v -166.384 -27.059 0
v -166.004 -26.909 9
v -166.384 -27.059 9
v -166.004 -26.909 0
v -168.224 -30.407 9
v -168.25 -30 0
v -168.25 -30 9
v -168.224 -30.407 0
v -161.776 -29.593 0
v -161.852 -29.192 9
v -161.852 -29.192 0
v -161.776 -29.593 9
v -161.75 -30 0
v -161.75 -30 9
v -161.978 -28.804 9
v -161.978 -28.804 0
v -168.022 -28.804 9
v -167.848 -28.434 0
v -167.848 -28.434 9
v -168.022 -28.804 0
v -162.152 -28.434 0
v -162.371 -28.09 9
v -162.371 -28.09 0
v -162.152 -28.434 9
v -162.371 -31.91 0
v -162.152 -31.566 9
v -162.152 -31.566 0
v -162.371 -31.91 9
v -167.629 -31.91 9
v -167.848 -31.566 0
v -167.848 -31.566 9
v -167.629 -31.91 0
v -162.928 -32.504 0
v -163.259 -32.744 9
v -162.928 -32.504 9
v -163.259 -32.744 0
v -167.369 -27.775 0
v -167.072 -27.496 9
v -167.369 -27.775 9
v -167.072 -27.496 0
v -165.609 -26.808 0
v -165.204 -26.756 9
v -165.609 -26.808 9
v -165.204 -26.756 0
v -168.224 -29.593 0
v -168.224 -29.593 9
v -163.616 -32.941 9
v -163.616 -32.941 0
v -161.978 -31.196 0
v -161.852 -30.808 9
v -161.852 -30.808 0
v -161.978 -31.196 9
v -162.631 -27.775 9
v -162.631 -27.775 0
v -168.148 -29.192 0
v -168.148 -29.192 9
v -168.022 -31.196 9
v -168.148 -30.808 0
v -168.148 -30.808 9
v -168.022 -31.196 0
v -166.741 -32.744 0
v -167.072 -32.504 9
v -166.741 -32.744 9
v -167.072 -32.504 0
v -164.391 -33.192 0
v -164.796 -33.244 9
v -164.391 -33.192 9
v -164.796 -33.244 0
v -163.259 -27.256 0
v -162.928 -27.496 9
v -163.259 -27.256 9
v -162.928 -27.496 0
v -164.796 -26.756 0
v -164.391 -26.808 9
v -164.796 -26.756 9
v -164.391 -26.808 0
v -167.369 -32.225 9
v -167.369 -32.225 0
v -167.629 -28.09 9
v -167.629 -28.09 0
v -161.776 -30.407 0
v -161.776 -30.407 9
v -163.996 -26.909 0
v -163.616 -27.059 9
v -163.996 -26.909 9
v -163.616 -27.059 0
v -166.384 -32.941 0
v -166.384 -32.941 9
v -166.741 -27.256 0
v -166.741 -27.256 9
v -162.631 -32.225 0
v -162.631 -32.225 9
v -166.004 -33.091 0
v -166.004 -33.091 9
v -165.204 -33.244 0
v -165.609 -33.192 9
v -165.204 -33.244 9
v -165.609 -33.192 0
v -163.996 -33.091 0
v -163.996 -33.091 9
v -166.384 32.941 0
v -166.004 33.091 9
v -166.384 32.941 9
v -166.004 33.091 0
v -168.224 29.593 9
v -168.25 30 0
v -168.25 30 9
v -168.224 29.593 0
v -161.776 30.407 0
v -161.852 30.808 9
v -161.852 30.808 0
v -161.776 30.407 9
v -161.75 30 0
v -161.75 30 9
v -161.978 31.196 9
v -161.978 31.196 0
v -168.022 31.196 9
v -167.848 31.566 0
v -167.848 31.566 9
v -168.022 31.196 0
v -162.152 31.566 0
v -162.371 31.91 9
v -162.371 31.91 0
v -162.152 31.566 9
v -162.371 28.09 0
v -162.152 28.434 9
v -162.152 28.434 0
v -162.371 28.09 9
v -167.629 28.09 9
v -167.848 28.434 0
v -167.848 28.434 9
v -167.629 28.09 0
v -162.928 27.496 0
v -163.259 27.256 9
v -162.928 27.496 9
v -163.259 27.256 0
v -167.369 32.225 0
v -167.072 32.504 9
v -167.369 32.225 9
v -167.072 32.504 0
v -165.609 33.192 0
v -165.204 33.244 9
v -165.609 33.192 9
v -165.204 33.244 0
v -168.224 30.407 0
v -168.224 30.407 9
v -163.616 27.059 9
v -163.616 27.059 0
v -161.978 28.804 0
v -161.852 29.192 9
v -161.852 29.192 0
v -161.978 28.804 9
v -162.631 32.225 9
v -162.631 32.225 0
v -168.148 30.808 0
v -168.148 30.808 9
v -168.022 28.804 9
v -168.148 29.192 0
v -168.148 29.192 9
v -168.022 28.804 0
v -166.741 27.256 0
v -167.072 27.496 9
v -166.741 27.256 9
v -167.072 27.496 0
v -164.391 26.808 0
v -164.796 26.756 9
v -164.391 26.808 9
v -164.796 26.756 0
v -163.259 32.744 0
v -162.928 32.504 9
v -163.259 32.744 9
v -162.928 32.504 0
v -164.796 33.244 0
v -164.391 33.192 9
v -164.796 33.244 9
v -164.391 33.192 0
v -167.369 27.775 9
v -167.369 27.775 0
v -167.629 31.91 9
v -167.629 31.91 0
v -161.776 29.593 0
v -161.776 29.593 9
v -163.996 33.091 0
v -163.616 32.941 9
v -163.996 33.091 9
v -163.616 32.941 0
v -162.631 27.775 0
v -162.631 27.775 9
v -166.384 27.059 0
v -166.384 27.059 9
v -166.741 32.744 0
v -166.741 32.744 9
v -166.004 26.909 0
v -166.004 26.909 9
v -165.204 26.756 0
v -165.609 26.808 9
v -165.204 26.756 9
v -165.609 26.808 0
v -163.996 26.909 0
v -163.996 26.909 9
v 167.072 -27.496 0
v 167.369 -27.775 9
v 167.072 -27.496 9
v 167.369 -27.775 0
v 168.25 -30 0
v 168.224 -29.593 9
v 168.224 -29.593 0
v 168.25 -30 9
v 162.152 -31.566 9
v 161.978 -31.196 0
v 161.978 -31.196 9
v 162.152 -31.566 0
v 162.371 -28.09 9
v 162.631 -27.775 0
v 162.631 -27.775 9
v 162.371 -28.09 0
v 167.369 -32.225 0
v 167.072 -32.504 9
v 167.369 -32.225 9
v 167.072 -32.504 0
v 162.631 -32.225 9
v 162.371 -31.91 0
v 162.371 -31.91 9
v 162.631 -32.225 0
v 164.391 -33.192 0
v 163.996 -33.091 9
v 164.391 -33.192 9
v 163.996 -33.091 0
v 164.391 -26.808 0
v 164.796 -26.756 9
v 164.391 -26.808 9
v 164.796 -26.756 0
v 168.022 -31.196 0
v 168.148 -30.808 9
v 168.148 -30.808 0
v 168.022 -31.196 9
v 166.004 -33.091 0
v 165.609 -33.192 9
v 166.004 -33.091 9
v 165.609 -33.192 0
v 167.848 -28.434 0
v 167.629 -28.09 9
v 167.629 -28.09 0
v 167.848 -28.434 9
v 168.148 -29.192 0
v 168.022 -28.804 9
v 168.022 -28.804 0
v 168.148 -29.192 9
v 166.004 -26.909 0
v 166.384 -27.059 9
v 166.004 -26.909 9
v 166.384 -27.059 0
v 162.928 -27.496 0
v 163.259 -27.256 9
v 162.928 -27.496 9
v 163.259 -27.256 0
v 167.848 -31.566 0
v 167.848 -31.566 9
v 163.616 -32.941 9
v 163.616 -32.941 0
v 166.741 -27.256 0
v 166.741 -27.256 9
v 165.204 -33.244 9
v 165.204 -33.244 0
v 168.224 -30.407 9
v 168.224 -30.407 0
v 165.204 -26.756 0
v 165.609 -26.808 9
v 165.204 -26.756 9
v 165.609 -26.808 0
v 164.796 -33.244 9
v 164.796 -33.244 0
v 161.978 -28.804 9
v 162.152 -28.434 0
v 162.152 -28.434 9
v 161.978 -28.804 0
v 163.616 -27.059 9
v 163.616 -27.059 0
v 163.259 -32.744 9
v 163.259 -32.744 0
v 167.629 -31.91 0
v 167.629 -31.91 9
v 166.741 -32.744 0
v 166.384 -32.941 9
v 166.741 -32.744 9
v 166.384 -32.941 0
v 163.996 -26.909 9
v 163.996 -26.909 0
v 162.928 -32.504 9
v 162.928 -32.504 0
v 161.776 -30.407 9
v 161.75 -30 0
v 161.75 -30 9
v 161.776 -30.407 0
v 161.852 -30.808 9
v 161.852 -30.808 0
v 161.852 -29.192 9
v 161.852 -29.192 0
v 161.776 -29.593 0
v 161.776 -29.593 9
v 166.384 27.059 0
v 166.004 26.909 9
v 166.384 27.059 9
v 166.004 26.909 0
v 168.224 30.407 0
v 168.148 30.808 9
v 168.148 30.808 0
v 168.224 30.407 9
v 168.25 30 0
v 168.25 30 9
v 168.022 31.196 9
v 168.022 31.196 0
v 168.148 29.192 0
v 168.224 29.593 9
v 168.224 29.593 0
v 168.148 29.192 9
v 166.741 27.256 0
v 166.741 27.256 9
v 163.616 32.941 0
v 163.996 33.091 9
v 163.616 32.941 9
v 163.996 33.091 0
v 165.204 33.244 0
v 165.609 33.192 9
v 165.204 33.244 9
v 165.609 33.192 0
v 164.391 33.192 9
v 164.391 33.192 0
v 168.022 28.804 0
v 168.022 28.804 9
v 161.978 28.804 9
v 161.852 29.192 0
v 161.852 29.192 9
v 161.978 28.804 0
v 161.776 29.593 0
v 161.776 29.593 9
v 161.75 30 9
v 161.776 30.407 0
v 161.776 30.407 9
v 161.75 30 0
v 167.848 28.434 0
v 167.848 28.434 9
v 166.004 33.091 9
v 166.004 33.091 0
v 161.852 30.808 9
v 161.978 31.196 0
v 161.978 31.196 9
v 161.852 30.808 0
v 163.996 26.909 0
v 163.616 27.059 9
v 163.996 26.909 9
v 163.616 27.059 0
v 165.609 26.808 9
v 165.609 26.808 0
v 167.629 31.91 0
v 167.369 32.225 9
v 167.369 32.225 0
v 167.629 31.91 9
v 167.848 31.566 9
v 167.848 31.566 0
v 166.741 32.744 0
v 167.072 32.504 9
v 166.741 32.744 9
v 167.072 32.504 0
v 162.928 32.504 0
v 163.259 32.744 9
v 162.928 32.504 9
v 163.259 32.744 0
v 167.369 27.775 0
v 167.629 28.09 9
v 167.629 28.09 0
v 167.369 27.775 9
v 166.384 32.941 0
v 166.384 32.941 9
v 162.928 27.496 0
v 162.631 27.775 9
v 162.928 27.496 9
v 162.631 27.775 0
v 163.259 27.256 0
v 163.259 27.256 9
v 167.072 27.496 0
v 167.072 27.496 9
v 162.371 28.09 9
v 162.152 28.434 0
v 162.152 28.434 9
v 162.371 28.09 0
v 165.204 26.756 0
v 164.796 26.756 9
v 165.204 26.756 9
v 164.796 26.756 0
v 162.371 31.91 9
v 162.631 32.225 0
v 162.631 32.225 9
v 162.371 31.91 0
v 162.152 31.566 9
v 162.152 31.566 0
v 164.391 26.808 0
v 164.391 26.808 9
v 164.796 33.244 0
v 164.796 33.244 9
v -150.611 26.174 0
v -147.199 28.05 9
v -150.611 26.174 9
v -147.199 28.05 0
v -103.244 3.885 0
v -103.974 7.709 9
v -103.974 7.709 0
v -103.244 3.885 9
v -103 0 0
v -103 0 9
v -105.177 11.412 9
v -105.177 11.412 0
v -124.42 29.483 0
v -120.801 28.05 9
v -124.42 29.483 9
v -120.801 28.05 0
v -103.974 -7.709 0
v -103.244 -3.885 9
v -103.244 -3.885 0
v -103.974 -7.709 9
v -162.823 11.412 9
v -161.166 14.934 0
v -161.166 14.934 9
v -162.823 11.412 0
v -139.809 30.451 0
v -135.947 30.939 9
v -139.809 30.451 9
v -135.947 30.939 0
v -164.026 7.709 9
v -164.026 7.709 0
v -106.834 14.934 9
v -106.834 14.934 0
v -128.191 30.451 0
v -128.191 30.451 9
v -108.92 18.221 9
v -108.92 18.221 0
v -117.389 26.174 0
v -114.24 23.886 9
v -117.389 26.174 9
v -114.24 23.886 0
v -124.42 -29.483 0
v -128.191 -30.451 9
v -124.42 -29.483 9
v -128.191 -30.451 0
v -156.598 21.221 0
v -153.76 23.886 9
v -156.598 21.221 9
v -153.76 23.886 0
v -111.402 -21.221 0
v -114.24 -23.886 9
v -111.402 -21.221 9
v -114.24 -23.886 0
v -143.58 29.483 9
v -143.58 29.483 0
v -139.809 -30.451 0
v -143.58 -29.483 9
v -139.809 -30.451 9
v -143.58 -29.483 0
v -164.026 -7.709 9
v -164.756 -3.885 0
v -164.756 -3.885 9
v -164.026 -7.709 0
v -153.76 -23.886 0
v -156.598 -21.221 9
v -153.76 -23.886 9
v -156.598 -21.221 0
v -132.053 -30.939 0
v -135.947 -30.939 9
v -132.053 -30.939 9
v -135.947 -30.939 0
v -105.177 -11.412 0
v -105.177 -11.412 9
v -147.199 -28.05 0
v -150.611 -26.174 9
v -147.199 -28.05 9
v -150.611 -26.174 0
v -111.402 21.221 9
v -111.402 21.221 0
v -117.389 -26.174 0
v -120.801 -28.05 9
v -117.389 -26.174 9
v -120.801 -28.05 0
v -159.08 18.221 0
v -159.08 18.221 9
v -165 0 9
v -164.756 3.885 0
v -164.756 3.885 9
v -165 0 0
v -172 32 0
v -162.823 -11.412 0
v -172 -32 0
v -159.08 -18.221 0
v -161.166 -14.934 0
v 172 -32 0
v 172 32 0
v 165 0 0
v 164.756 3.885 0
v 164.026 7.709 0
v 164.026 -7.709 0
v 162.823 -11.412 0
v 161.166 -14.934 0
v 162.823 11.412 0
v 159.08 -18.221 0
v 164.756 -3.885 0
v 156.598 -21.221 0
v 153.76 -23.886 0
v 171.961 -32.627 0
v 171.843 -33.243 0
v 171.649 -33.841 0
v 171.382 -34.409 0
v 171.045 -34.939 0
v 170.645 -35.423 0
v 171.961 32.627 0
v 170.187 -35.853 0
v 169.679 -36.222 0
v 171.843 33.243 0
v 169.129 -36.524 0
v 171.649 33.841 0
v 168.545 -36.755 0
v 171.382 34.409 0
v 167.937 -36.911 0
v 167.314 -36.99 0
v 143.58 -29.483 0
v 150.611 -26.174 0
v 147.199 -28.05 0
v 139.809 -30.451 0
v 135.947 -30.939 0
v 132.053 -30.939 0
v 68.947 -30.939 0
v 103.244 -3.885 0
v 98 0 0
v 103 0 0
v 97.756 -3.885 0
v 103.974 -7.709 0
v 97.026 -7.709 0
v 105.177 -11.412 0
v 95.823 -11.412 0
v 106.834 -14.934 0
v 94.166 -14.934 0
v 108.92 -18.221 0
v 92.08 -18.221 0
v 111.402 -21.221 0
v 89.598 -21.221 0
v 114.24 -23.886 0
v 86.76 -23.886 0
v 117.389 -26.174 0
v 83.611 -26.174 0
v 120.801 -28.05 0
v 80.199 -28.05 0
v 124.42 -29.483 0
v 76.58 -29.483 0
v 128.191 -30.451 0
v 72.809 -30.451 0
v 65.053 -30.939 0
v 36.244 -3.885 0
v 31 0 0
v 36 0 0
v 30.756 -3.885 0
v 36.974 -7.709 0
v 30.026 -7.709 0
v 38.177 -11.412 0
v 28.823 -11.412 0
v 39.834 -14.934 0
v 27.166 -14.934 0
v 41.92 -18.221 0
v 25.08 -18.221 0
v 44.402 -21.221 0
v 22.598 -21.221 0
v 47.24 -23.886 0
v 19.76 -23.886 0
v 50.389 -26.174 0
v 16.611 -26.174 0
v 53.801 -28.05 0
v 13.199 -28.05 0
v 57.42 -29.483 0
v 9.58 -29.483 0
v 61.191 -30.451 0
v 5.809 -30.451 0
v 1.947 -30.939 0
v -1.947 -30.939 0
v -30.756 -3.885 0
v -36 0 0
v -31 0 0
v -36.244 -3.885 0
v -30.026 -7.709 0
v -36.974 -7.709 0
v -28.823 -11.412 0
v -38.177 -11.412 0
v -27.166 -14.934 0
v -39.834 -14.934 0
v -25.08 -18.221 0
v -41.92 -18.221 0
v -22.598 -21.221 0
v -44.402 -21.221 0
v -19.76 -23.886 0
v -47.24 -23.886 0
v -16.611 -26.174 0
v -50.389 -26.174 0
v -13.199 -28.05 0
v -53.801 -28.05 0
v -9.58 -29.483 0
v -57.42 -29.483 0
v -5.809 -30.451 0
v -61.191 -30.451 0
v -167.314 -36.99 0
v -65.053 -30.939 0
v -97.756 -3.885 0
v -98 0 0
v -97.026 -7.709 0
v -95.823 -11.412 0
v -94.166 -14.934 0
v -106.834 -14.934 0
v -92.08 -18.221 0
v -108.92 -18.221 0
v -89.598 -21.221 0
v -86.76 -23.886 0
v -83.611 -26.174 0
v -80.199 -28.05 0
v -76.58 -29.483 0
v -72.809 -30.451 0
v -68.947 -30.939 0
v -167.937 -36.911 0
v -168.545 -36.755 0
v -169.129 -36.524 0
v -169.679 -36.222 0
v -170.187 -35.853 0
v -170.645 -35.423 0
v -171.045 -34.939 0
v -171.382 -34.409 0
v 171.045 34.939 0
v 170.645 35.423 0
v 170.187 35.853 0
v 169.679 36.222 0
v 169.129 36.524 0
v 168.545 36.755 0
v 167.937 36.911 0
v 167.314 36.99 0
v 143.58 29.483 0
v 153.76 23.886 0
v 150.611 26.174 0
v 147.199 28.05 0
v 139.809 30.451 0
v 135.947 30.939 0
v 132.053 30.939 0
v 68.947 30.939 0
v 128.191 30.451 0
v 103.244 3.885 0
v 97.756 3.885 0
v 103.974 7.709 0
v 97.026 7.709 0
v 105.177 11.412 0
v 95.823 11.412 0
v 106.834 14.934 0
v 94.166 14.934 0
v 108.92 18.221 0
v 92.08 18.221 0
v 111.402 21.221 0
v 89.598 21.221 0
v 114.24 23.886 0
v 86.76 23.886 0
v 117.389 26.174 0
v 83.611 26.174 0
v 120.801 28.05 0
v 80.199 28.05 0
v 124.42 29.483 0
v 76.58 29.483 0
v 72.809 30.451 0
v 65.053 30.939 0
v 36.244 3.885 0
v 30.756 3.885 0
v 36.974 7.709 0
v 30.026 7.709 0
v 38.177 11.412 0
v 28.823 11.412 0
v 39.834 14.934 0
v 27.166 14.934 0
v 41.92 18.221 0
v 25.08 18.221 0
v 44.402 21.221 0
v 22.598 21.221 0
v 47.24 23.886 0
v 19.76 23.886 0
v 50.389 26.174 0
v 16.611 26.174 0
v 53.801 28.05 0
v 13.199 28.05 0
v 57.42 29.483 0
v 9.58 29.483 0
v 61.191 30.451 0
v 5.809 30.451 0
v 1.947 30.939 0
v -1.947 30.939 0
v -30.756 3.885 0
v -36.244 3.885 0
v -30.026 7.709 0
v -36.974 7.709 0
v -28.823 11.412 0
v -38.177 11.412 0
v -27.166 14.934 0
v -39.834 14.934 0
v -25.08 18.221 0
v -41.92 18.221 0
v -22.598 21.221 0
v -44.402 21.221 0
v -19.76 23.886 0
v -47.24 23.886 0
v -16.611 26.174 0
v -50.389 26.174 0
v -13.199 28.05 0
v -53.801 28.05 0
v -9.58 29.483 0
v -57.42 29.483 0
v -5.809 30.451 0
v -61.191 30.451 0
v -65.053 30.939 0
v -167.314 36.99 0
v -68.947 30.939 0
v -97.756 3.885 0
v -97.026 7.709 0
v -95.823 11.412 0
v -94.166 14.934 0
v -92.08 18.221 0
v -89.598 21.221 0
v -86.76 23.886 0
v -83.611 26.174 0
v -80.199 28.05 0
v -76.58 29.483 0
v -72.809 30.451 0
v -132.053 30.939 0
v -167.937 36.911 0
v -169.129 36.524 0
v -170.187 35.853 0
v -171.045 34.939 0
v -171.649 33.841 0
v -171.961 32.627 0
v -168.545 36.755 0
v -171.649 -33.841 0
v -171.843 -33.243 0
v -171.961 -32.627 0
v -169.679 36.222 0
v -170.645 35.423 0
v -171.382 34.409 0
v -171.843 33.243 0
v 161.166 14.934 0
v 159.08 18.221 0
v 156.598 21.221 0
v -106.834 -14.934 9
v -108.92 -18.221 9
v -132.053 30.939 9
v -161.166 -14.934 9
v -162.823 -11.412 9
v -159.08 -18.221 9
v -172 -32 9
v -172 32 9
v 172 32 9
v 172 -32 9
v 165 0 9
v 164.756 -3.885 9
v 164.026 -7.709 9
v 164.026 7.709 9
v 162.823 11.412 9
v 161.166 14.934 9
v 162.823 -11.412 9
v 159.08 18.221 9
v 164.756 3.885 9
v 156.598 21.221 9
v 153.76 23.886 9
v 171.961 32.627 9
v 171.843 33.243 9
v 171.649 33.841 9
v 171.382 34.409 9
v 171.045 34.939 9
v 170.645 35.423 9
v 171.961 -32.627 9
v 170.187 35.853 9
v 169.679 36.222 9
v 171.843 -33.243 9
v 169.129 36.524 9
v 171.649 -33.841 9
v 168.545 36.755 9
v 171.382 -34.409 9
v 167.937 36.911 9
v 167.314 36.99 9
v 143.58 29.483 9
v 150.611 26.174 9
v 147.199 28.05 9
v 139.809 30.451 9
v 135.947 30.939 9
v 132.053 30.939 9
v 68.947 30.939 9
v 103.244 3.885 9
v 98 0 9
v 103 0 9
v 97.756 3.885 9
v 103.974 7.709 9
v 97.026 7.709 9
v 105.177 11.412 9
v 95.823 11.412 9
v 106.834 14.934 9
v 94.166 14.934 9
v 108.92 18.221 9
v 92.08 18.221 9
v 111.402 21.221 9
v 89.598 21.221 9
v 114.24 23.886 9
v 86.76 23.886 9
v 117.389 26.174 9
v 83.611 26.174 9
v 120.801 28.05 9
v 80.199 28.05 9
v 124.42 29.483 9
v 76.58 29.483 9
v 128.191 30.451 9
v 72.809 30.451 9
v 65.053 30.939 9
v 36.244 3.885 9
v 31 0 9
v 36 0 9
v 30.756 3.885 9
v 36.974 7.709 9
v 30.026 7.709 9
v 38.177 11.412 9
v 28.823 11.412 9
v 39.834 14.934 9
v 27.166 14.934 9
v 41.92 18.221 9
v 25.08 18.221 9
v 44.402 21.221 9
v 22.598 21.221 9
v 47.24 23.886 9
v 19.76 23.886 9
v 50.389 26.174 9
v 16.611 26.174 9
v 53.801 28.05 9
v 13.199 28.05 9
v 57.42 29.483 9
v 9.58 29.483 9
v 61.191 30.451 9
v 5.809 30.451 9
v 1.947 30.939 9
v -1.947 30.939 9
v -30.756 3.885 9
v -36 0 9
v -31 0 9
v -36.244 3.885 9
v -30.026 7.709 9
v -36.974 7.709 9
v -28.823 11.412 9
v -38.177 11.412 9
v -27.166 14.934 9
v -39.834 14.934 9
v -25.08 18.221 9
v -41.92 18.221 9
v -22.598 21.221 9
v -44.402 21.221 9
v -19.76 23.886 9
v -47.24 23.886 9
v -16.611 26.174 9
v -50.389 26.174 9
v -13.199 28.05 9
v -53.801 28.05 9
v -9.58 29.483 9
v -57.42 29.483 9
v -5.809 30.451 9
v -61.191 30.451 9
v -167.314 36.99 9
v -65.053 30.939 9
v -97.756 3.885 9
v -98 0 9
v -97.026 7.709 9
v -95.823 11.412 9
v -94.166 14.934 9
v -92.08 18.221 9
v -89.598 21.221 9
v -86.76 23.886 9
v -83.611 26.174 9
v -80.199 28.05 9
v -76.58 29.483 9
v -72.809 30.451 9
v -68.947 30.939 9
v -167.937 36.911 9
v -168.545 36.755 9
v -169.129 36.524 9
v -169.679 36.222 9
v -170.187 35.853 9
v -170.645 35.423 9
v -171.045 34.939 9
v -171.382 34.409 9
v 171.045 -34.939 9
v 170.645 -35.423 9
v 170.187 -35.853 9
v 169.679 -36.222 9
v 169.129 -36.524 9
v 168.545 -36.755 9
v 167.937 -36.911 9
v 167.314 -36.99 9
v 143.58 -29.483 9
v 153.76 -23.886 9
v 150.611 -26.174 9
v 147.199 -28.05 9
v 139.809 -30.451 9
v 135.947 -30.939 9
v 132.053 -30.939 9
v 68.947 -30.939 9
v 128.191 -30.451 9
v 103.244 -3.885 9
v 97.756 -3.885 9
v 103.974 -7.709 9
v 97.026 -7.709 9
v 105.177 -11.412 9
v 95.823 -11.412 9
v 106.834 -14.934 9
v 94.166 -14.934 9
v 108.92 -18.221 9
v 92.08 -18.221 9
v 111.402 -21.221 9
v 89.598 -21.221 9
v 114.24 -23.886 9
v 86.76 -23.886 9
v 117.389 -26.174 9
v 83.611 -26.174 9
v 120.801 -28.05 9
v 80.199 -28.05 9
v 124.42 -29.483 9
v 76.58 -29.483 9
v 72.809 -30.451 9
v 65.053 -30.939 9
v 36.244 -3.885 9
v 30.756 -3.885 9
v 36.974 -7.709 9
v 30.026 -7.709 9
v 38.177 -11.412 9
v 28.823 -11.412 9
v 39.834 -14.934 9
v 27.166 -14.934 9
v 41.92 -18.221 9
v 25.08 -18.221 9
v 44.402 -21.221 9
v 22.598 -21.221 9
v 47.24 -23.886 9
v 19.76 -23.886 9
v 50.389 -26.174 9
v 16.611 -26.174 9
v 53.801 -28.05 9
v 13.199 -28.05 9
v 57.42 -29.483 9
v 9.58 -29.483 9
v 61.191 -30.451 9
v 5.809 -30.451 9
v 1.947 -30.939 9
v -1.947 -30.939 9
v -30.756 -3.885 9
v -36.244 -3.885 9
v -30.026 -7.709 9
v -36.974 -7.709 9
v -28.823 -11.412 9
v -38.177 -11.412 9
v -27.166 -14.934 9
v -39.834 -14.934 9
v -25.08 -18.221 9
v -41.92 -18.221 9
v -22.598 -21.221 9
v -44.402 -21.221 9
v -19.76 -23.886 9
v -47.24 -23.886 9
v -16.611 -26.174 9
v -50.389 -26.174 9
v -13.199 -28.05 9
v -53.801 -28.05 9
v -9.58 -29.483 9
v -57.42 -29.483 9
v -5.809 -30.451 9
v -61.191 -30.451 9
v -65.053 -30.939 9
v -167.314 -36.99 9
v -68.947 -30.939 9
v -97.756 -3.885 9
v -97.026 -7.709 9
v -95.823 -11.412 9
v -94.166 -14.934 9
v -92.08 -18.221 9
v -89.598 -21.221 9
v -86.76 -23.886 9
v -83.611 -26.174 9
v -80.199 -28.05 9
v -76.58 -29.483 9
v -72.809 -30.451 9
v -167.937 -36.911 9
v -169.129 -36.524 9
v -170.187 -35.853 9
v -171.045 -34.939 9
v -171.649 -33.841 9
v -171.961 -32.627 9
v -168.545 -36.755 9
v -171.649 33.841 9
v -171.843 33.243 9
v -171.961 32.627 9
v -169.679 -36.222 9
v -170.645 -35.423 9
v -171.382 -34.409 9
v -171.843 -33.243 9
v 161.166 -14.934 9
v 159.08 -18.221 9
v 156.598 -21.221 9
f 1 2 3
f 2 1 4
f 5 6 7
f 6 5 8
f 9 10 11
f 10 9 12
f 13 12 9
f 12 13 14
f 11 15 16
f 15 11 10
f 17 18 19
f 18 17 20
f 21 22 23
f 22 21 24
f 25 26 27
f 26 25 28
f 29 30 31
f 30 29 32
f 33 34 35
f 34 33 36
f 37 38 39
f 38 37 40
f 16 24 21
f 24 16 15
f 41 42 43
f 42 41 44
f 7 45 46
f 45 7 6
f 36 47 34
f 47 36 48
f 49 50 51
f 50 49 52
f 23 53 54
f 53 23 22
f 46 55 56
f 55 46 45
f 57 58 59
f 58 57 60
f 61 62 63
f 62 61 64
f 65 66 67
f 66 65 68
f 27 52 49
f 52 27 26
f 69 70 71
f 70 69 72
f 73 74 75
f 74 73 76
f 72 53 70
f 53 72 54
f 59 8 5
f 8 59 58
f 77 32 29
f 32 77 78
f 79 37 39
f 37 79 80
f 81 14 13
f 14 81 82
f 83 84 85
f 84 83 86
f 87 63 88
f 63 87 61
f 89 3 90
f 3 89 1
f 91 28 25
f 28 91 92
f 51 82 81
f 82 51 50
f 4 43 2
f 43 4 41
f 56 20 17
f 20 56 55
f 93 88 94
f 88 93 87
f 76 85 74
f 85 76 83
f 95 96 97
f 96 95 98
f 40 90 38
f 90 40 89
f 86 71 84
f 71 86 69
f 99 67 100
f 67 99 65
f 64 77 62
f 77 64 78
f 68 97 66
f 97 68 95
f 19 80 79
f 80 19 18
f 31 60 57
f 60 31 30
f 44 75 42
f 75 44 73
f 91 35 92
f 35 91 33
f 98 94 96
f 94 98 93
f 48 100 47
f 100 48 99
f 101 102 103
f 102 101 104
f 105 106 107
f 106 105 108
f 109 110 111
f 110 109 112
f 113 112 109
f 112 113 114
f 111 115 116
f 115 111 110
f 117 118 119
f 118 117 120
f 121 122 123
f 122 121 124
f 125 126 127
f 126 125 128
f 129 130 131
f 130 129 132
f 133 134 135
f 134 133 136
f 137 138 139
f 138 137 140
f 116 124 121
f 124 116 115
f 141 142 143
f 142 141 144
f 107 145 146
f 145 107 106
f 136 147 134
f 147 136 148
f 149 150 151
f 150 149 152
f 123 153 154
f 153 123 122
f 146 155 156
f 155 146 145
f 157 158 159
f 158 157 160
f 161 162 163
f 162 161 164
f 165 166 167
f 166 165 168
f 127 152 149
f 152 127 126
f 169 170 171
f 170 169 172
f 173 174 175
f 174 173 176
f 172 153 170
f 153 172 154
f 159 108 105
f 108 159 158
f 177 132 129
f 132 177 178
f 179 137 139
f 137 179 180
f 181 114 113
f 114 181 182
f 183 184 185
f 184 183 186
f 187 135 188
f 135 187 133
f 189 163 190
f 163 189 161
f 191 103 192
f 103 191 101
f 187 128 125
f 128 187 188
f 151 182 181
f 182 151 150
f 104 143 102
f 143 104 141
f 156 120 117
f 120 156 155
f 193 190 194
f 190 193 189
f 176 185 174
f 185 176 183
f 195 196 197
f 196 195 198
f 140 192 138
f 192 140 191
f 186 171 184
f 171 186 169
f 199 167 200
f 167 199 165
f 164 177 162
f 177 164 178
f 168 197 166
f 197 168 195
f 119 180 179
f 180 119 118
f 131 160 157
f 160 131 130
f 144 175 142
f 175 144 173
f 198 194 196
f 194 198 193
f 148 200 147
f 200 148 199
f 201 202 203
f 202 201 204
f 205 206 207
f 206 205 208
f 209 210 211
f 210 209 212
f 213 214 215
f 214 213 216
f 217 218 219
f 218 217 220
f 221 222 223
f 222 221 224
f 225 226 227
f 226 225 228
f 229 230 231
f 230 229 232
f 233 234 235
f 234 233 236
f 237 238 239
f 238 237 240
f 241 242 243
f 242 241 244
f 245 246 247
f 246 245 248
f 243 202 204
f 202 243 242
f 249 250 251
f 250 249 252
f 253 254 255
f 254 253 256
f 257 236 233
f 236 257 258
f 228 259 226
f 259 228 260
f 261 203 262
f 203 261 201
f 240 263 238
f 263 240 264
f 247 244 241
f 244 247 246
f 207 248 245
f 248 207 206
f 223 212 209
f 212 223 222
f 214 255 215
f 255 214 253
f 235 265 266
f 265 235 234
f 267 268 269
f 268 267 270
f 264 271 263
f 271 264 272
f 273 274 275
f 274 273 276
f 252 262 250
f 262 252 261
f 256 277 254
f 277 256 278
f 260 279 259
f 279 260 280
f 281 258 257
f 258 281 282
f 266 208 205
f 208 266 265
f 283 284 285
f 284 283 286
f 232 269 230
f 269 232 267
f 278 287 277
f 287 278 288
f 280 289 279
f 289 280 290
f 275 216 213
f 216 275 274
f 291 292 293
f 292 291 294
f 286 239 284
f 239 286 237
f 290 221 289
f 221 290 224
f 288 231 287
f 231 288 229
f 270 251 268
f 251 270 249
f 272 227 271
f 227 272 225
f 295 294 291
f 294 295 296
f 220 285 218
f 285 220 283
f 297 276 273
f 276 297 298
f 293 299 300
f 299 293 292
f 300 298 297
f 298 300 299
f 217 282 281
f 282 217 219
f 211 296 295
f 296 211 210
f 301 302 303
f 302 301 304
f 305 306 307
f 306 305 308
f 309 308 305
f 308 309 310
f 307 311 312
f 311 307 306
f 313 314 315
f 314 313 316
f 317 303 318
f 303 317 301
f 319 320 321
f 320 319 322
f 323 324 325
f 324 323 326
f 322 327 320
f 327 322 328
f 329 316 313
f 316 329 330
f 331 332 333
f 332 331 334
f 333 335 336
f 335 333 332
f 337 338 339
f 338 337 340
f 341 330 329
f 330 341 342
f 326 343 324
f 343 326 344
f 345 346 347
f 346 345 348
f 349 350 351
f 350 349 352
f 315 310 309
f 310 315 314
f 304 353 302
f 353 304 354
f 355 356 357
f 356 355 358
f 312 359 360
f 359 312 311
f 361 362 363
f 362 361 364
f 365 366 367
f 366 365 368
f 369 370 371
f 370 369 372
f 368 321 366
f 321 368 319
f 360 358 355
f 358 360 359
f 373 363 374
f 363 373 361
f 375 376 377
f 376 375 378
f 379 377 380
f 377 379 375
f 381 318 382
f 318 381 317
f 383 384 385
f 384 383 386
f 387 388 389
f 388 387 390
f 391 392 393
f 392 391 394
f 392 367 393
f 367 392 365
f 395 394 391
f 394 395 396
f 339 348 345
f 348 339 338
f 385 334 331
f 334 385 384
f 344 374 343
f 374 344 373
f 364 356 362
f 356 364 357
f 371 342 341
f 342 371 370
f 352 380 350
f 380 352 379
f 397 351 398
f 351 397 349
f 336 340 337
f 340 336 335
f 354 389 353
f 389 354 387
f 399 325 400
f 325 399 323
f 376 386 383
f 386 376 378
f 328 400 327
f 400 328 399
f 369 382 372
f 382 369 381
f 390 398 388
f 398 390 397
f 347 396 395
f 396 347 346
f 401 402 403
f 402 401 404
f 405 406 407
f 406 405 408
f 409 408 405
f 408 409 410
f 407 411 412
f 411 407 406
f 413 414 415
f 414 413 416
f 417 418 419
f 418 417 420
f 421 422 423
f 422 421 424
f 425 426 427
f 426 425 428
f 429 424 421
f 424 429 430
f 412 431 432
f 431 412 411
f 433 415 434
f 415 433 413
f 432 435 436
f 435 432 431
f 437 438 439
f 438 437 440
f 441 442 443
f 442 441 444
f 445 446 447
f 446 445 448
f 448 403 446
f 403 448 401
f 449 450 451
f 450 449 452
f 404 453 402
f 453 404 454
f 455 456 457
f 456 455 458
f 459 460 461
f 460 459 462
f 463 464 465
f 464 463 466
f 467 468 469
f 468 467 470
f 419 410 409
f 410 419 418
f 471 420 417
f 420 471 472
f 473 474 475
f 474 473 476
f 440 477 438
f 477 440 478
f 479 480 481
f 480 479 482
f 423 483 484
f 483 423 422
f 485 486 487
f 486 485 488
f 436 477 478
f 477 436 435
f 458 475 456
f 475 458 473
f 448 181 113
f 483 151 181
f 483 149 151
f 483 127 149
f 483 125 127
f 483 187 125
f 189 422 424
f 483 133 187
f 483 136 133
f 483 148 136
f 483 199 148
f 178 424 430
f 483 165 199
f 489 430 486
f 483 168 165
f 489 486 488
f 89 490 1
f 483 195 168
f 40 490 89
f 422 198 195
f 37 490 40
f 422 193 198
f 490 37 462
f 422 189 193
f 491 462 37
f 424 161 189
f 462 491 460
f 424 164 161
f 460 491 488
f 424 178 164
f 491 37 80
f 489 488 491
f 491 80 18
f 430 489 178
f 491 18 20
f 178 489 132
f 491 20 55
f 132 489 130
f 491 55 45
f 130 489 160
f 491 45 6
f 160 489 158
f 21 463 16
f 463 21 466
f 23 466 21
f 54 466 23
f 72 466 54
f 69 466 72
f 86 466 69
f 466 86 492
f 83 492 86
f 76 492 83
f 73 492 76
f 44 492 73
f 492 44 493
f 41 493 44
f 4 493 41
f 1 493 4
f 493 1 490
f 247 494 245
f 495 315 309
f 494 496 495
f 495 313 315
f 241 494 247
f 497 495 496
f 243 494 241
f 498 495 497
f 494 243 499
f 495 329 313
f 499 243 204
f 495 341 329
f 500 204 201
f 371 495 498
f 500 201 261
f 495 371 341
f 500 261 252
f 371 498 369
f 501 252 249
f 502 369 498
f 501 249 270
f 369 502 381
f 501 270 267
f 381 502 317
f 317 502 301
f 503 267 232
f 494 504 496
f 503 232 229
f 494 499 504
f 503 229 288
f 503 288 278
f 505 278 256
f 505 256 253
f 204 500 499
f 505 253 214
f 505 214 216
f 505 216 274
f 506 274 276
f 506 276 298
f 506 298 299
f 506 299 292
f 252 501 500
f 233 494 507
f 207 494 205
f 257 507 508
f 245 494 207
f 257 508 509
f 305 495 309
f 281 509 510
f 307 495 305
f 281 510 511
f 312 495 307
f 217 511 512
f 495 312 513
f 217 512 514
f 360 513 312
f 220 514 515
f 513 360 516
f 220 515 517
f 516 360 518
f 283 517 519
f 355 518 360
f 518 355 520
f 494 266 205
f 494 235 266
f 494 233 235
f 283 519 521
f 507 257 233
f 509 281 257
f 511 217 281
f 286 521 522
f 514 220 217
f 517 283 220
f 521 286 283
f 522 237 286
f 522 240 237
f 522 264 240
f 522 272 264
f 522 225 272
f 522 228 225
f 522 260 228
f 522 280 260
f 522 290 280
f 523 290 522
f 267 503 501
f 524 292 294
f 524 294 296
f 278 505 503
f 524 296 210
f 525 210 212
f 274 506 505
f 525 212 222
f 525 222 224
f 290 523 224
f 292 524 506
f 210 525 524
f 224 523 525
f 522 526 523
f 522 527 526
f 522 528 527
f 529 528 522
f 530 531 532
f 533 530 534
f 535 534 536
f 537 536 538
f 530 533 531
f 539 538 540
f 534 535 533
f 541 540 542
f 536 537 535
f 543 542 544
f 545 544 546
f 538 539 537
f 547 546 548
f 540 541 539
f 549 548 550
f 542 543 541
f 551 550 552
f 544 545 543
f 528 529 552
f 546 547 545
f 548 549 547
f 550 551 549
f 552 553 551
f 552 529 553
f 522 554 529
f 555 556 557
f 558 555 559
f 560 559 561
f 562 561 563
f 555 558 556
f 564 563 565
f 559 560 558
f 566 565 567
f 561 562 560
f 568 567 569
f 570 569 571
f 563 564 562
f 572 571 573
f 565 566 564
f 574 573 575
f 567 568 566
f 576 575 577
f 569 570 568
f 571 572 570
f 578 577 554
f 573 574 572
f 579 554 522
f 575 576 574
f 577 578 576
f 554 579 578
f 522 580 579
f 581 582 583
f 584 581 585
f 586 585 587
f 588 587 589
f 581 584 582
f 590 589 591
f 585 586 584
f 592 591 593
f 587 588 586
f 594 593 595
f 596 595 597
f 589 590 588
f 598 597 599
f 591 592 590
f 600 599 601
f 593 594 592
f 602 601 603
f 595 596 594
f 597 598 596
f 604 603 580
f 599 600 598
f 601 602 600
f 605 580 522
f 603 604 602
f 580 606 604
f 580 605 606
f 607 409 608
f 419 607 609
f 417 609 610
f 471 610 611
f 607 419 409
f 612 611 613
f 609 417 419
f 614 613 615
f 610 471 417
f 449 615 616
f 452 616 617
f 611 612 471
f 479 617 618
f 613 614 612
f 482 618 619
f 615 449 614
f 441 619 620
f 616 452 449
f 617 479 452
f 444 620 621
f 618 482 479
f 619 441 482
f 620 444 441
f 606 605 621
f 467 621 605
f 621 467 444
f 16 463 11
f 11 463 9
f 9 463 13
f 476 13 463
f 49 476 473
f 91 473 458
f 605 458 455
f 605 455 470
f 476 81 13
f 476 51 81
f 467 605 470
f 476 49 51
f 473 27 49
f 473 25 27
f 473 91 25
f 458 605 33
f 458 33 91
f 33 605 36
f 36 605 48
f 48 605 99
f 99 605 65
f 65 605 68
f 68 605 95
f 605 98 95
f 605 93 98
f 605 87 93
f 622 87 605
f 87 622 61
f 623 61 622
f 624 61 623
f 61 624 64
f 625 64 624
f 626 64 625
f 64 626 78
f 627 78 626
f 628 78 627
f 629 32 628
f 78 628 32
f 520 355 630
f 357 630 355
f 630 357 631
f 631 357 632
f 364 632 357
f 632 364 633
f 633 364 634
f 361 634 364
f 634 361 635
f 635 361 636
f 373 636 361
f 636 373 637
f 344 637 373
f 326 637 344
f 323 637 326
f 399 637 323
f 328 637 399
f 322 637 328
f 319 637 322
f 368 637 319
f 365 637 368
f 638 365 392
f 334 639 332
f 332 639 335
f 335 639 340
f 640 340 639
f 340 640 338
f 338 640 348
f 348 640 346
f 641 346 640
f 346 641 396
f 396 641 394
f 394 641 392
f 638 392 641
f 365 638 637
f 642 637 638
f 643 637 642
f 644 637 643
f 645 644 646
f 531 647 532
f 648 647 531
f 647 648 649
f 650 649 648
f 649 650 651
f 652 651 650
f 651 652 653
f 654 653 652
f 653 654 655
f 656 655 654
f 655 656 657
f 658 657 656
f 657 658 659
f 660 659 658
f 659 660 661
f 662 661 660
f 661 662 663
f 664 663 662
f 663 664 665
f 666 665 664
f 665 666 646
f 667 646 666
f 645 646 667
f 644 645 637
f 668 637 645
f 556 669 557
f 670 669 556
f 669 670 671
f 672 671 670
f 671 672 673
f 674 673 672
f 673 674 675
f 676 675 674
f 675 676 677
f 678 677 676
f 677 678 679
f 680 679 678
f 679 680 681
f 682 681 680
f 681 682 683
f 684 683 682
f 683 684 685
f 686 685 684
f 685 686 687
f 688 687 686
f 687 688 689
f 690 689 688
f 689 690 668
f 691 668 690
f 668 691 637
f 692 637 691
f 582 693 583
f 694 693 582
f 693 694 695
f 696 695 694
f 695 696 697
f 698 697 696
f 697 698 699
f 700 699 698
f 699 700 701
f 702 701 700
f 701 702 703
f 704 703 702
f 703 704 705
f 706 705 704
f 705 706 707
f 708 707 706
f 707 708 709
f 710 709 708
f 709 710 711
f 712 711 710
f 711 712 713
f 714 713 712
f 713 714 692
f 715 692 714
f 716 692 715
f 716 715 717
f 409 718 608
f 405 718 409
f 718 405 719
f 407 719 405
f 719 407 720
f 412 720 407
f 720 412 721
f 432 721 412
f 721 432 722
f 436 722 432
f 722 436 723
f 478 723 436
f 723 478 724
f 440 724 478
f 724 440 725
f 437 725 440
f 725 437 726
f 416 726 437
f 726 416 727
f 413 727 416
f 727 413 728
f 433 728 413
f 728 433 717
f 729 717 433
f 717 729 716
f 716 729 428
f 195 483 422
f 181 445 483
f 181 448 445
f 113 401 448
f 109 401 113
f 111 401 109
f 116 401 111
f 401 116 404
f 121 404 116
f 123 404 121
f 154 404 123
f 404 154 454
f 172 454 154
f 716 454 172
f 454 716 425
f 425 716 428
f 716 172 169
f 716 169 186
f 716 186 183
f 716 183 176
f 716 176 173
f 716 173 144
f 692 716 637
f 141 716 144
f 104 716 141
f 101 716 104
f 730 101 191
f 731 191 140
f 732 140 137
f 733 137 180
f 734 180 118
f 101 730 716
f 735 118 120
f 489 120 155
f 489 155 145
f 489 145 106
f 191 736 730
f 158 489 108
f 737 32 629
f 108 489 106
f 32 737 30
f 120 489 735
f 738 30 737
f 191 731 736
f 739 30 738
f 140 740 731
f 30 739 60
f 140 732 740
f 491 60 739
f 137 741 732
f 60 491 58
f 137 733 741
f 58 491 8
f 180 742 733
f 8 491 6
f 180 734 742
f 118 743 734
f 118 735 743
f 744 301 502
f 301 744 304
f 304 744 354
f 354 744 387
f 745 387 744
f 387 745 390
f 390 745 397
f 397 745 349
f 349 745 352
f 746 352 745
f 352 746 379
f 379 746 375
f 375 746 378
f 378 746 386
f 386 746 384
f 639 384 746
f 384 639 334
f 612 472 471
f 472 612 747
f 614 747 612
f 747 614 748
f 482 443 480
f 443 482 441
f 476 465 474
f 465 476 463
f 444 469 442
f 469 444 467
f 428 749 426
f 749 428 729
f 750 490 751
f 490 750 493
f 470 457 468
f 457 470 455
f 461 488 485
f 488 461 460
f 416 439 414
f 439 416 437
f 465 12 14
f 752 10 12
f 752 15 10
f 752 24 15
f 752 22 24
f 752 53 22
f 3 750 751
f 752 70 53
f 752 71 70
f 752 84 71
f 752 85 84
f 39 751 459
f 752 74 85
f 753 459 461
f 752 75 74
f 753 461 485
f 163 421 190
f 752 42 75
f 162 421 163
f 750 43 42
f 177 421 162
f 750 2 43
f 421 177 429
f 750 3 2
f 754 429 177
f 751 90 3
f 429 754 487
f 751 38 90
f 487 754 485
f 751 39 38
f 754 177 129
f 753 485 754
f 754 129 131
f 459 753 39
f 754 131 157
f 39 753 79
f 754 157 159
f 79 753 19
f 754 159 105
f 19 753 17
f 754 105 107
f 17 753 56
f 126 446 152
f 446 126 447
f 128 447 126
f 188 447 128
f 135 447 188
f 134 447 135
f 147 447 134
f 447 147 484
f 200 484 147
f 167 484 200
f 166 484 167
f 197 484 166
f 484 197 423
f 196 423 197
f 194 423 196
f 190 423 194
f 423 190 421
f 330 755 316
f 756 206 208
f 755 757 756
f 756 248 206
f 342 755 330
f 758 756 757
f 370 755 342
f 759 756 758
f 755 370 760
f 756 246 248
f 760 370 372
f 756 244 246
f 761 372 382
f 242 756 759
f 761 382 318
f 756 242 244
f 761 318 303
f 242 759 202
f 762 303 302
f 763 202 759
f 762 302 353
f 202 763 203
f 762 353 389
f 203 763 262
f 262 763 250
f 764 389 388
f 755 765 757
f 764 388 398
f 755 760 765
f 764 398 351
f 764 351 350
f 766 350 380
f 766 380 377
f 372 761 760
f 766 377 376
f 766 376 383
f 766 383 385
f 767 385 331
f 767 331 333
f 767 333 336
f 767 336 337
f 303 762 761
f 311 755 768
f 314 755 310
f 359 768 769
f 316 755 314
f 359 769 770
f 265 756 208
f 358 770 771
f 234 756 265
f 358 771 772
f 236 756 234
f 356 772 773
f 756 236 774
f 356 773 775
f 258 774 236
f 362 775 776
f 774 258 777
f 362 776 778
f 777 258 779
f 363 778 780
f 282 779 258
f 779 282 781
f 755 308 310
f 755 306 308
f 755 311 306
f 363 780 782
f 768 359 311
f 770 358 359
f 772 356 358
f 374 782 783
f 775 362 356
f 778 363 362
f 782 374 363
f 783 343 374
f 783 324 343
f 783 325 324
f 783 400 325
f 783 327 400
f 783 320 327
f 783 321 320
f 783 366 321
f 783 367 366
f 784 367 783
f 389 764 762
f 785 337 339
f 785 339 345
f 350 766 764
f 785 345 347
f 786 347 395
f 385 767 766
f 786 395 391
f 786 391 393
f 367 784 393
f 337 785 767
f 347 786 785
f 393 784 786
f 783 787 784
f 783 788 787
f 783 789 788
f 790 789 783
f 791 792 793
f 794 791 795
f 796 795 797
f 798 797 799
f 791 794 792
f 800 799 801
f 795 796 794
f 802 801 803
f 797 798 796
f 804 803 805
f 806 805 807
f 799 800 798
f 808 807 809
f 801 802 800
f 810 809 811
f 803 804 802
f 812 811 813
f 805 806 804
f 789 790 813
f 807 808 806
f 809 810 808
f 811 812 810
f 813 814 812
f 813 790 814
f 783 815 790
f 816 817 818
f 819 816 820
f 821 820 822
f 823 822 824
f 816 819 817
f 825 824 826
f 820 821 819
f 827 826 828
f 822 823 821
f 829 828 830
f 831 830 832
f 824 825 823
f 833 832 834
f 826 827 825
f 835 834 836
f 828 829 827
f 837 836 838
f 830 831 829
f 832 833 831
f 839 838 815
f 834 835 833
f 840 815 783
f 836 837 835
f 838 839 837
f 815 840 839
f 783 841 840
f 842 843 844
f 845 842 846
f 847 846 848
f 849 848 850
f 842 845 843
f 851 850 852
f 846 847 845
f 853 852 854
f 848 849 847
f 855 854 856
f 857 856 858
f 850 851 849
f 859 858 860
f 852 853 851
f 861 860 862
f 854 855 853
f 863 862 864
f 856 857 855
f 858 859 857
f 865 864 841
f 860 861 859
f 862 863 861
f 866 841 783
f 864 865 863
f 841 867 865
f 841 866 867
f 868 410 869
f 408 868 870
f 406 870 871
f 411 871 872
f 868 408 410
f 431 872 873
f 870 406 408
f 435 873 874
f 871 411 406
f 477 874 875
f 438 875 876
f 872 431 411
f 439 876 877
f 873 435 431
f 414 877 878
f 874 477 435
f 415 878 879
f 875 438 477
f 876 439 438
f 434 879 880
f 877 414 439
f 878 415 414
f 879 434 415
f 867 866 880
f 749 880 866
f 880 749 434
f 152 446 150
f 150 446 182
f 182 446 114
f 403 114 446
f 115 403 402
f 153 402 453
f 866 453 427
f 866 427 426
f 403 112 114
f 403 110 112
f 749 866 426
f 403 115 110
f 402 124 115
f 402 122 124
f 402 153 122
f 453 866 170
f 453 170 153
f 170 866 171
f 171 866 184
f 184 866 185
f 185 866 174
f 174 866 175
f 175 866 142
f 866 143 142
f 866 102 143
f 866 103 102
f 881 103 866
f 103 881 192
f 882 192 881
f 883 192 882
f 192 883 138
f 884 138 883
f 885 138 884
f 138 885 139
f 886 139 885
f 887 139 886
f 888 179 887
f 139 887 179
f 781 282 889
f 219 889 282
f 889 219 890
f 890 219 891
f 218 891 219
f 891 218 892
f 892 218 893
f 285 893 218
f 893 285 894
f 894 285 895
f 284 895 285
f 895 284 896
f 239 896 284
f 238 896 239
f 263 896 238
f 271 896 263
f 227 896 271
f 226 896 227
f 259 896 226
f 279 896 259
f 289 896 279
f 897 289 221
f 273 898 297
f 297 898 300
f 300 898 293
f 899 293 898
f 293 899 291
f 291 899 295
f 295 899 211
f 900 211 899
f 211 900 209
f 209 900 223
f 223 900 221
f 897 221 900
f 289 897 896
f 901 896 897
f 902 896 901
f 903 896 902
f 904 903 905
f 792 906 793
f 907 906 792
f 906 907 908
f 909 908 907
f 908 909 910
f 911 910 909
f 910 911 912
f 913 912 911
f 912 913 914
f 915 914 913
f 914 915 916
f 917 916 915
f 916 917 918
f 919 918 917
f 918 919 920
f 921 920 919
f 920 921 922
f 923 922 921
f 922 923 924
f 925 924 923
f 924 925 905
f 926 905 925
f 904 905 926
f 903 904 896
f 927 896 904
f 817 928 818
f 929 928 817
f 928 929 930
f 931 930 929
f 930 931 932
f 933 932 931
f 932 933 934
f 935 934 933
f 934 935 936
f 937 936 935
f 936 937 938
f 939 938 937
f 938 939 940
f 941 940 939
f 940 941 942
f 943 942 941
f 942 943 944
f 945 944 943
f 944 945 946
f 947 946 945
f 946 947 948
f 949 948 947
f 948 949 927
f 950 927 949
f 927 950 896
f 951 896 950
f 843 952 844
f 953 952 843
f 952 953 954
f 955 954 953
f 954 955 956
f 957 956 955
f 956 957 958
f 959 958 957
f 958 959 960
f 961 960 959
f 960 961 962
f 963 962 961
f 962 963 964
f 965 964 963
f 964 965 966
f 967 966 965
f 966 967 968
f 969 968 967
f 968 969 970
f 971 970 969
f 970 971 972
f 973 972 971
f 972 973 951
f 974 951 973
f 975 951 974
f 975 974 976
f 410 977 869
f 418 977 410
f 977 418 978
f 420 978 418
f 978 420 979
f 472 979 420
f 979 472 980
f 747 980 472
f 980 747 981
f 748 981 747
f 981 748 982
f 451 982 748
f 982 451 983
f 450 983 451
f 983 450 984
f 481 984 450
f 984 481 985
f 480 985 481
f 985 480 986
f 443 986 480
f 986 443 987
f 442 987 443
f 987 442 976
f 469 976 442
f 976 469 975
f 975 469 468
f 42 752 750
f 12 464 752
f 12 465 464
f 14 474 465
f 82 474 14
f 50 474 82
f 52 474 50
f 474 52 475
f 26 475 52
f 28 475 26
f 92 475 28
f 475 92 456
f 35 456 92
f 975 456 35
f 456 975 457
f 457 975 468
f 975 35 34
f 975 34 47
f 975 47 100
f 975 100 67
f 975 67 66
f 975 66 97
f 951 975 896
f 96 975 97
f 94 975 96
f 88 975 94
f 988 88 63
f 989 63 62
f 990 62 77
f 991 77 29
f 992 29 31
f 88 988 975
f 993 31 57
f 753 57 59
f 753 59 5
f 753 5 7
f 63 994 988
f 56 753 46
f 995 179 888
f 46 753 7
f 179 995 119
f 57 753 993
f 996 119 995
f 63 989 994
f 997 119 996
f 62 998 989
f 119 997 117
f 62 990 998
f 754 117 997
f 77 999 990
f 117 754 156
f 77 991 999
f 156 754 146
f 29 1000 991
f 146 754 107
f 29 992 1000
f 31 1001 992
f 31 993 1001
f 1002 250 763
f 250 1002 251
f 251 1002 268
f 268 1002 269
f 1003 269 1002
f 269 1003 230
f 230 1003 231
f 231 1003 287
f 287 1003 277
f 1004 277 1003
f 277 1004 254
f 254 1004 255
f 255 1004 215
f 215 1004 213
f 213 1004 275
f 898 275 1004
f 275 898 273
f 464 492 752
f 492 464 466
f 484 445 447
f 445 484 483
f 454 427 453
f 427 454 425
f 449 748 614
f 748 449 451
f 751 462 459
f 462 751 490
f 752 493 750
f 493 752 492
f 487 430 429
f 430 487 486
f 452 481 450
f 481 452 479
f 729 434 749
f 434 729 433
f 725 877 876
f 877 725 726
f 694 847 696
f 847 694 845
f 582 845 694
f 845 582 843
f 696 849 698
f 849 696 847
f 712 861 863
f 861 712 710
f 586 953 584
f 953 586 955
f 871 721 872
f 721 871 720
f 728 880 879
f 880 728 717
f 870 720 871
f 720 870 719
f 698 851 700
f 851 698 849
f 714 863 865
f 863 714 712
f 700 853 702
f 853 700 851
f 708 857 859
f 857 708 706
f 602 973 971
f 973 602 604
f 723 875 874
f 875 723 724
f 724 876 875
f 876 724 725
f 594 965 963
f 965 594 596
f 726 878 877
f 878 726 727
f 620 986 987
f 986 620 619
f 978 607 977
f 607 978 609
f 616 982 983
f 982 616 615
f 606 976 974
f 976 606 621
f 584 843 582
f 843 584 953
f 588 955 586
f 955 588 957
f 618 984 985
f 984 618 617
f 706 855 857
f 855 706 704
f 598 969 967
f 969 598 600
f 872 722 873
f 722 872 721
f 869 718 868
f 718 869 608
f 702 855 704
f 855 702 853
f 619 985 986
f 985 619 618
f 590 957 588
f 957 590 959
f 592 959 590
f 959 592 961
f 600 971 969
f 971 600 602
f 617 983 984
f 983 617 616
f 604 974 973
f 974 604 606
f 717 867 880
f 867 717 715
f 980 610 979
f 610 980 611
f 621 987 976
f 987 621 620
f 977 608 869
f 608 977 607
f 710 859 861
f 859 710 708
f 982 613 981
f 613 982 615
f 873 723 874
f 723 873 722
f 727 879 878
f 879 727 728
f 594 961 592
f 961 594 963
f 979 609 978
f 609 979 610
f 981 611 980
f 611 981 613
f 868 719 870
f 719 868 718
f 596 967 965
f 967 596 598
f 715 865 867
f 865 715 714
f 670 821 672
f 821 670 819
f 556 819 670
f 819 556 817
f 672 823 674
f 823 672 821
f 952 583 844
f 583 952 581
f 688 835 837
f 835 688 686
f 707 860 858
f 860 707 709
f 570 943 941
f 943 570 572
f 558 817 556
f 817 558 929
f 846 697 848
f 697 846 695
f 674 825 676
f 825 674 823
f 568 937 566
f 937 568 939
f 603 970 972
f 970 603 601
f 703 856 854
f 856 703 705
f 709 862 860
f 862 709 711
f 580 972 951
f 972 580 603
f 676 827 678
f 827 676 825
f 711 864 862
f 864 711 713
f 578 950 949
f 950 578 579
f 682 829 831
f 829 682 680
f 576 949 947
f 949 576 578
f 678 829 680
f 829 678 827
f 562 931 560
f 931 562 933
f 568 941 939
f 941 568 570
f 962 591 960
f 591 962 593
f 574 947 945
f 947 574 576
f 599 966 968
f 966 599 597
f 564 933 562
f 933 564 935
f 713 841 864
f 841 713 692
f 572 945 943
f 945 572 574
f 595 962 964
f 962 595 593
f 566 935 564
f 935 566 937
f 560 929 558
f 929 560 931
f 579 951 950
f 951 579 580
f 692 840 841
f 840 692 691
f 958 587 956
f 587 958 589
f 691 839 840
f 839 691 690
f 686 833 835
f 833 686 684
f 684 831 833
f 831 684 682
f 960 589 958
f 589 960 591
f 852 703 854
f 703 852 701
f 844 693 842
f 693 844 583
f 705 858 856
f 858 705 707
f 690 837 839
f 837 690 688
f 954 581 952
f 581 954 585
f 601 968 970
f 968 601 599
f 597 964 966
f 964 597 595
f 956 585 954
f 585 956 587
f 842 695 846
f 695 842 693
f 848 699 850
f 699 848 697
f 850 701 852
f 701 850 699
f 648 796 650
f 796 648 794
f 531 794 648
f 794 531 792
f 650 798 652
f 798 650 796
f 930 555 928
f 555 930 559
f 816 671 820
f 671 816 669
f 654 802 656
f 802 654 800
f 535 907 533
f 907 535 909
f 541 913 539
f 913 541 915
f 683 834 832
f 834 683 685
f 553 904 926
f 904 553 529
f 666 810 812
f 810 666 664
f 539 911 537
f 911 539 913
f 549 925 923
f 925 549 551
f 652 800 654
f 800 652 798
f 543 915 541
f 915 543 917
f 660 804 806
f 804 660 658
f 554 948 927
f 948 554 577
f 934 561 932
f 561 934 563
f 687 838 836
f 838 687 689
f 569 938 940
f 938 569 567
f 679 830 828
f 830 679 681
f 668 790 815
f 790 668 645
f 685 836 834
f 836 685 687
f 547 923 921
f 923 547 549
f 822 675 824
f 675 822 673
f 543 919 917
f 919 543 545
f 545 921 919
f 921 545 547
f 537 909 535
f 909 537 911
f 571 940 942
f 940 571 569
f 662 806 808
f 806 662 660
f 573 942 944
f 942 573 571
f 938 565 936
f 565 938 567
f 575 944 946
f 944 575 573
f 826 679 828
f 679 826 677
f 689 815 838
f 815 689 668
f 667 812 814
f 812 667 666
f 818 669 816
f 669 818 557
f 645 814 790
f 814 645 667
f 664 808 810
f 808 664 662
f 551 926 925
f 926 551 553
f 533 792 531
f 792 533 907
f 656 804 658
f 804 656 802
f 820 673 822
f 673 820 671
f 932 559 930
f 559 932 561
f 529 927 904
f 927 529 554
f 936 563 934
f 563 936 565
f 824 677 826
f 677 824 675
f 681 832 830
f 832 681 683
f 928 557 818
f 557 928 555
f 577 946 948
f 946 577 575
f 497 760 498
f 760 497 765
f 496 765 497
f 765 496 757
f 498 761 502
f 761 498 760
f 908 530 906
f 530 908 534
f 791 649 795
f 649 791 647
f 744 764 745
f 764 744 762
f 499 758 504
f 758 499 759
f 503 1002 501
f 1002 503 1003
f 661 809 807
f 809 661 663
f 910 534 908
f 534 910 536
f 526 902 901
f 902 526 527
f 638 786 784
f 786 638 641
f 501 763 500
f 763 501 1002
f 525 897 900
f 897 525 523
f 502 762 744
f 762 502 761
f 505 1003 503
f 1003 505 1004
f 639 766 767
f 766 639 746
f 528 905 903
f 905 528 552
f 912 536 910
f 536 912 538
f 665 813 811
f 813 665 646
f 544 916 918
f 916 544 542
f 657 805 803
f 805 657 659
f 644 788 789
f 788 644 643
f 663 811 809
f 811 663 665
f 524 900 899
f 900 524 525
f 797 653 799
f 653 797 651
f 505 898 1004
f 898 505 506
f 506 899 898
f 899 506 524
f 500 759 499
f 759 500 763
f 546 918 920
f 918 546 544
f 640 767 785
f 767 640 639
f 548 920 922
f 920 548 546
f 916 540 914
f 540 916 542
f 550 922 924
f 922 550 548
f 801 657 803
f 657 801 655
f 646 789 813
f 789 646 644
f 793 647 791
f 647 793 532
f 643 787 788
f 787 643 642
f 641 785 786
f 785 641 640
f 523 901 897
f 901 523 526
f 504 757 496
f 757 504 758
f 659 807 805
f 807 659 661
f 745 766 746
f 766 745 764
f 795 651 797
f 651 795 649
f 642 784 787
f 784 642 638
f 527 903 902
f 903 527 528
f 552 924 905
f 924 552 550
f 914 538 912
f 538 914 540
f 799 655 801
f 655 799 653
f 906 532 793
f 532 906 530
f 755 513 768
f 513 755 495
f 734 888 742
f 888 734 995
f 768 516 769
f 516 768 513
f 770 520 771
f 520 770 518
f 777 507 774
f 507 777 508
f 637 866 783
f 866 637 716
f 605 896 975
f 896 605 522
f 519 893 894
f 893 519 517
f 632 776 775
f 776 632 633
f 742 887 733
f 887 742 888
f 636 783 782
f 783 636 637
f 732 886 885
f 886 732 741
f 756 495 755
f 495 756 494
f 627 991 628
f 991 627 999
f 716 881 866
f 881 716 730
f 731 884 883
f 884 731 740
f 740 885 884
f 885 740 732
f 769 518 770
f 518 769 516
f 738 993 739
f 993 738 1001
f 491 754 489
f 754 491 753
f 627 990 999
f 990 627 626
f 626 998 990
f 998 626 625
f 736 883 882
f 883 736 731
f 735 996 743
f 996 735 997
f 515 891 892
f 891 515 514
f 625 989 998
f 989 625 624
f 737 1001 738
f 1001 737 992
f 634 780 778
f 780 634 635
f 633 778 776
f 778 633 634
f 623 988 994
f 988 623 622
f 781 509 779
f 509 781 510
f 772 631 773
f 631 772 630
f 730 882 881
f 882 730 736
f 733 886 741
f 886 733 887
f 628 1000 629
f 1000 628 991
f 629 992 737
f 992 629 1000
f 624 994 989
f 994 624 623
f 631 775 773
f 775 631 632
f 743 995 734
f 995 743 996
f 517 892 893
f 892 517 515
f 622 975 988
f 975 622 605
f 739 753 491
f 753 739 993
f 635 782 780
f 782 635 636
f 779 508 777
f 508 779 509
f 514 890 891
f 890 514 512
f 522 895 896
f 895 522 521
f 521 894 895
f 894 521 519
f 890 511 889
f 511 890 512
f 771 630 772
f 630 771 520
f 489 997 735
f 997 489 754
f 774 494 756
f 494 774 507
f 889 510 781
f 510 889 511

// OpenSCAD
$fn = 50;


difference() {
	union() {
		hull() {
			translate(v = [-167.0000000000, 32.0000000000, 0]) {
				cylinder(h = 9, r = 5);
			}
			translate(v = [167.0000000000, 32.0000000000, 0]) {
				cylinder(h = 9, r = 5);
			}
			translate(v = [-167.0000000000, -32.0000000000, 0]) {
				cylinder(h = 9, r = 5);
			}
			translate(v = [167.0000000000, -32.0000000000, 0]) {
				cylinder(h = 9, r = 5);
			}
		}
	}
	union() {
		#translate(v = [-165.0000000000, -30.0000000000, -100.0000000000]) {
			cylinder(h = 200, r = 3.2500000000);
		}
		#translate(v = [-165.0000000000, 30.0000000000, -100.0000000000]) {
			cylinder(h = 200, r = 3.2500000000);
		}
		#translate(v = [165.0000000000, -30.0000000000, -100.0000000000]) {
			cylinder(h = 200, r = 3.2500000000);
		}
		#translate(v = [165.0000000000, 30.0000000000, -100.0000000000]) {
			cylinder(h = 200, r = 3.2500000000);
		}
		#translate(v = [-134.0000000000, 0, 0]) {
			cylinder(h = 9, r = 31.0000000000);
		}
		#translate(v = [-67.0000000000, 0, 0]) {
			cylinder(h = 9, r = 31.0000000000);
		}
		#cylinder(h = 9, r = 31.0000000000);
		#translate(v = [67.0000000000, 0, 0]) {
			cylinder(h = 9, r = 31.0000000000);
		}
		#translate(v = [134.0000000000, 0, 0]) {
			cylinder(h = 9, r = 31.0000000000);
		}
	}
}
